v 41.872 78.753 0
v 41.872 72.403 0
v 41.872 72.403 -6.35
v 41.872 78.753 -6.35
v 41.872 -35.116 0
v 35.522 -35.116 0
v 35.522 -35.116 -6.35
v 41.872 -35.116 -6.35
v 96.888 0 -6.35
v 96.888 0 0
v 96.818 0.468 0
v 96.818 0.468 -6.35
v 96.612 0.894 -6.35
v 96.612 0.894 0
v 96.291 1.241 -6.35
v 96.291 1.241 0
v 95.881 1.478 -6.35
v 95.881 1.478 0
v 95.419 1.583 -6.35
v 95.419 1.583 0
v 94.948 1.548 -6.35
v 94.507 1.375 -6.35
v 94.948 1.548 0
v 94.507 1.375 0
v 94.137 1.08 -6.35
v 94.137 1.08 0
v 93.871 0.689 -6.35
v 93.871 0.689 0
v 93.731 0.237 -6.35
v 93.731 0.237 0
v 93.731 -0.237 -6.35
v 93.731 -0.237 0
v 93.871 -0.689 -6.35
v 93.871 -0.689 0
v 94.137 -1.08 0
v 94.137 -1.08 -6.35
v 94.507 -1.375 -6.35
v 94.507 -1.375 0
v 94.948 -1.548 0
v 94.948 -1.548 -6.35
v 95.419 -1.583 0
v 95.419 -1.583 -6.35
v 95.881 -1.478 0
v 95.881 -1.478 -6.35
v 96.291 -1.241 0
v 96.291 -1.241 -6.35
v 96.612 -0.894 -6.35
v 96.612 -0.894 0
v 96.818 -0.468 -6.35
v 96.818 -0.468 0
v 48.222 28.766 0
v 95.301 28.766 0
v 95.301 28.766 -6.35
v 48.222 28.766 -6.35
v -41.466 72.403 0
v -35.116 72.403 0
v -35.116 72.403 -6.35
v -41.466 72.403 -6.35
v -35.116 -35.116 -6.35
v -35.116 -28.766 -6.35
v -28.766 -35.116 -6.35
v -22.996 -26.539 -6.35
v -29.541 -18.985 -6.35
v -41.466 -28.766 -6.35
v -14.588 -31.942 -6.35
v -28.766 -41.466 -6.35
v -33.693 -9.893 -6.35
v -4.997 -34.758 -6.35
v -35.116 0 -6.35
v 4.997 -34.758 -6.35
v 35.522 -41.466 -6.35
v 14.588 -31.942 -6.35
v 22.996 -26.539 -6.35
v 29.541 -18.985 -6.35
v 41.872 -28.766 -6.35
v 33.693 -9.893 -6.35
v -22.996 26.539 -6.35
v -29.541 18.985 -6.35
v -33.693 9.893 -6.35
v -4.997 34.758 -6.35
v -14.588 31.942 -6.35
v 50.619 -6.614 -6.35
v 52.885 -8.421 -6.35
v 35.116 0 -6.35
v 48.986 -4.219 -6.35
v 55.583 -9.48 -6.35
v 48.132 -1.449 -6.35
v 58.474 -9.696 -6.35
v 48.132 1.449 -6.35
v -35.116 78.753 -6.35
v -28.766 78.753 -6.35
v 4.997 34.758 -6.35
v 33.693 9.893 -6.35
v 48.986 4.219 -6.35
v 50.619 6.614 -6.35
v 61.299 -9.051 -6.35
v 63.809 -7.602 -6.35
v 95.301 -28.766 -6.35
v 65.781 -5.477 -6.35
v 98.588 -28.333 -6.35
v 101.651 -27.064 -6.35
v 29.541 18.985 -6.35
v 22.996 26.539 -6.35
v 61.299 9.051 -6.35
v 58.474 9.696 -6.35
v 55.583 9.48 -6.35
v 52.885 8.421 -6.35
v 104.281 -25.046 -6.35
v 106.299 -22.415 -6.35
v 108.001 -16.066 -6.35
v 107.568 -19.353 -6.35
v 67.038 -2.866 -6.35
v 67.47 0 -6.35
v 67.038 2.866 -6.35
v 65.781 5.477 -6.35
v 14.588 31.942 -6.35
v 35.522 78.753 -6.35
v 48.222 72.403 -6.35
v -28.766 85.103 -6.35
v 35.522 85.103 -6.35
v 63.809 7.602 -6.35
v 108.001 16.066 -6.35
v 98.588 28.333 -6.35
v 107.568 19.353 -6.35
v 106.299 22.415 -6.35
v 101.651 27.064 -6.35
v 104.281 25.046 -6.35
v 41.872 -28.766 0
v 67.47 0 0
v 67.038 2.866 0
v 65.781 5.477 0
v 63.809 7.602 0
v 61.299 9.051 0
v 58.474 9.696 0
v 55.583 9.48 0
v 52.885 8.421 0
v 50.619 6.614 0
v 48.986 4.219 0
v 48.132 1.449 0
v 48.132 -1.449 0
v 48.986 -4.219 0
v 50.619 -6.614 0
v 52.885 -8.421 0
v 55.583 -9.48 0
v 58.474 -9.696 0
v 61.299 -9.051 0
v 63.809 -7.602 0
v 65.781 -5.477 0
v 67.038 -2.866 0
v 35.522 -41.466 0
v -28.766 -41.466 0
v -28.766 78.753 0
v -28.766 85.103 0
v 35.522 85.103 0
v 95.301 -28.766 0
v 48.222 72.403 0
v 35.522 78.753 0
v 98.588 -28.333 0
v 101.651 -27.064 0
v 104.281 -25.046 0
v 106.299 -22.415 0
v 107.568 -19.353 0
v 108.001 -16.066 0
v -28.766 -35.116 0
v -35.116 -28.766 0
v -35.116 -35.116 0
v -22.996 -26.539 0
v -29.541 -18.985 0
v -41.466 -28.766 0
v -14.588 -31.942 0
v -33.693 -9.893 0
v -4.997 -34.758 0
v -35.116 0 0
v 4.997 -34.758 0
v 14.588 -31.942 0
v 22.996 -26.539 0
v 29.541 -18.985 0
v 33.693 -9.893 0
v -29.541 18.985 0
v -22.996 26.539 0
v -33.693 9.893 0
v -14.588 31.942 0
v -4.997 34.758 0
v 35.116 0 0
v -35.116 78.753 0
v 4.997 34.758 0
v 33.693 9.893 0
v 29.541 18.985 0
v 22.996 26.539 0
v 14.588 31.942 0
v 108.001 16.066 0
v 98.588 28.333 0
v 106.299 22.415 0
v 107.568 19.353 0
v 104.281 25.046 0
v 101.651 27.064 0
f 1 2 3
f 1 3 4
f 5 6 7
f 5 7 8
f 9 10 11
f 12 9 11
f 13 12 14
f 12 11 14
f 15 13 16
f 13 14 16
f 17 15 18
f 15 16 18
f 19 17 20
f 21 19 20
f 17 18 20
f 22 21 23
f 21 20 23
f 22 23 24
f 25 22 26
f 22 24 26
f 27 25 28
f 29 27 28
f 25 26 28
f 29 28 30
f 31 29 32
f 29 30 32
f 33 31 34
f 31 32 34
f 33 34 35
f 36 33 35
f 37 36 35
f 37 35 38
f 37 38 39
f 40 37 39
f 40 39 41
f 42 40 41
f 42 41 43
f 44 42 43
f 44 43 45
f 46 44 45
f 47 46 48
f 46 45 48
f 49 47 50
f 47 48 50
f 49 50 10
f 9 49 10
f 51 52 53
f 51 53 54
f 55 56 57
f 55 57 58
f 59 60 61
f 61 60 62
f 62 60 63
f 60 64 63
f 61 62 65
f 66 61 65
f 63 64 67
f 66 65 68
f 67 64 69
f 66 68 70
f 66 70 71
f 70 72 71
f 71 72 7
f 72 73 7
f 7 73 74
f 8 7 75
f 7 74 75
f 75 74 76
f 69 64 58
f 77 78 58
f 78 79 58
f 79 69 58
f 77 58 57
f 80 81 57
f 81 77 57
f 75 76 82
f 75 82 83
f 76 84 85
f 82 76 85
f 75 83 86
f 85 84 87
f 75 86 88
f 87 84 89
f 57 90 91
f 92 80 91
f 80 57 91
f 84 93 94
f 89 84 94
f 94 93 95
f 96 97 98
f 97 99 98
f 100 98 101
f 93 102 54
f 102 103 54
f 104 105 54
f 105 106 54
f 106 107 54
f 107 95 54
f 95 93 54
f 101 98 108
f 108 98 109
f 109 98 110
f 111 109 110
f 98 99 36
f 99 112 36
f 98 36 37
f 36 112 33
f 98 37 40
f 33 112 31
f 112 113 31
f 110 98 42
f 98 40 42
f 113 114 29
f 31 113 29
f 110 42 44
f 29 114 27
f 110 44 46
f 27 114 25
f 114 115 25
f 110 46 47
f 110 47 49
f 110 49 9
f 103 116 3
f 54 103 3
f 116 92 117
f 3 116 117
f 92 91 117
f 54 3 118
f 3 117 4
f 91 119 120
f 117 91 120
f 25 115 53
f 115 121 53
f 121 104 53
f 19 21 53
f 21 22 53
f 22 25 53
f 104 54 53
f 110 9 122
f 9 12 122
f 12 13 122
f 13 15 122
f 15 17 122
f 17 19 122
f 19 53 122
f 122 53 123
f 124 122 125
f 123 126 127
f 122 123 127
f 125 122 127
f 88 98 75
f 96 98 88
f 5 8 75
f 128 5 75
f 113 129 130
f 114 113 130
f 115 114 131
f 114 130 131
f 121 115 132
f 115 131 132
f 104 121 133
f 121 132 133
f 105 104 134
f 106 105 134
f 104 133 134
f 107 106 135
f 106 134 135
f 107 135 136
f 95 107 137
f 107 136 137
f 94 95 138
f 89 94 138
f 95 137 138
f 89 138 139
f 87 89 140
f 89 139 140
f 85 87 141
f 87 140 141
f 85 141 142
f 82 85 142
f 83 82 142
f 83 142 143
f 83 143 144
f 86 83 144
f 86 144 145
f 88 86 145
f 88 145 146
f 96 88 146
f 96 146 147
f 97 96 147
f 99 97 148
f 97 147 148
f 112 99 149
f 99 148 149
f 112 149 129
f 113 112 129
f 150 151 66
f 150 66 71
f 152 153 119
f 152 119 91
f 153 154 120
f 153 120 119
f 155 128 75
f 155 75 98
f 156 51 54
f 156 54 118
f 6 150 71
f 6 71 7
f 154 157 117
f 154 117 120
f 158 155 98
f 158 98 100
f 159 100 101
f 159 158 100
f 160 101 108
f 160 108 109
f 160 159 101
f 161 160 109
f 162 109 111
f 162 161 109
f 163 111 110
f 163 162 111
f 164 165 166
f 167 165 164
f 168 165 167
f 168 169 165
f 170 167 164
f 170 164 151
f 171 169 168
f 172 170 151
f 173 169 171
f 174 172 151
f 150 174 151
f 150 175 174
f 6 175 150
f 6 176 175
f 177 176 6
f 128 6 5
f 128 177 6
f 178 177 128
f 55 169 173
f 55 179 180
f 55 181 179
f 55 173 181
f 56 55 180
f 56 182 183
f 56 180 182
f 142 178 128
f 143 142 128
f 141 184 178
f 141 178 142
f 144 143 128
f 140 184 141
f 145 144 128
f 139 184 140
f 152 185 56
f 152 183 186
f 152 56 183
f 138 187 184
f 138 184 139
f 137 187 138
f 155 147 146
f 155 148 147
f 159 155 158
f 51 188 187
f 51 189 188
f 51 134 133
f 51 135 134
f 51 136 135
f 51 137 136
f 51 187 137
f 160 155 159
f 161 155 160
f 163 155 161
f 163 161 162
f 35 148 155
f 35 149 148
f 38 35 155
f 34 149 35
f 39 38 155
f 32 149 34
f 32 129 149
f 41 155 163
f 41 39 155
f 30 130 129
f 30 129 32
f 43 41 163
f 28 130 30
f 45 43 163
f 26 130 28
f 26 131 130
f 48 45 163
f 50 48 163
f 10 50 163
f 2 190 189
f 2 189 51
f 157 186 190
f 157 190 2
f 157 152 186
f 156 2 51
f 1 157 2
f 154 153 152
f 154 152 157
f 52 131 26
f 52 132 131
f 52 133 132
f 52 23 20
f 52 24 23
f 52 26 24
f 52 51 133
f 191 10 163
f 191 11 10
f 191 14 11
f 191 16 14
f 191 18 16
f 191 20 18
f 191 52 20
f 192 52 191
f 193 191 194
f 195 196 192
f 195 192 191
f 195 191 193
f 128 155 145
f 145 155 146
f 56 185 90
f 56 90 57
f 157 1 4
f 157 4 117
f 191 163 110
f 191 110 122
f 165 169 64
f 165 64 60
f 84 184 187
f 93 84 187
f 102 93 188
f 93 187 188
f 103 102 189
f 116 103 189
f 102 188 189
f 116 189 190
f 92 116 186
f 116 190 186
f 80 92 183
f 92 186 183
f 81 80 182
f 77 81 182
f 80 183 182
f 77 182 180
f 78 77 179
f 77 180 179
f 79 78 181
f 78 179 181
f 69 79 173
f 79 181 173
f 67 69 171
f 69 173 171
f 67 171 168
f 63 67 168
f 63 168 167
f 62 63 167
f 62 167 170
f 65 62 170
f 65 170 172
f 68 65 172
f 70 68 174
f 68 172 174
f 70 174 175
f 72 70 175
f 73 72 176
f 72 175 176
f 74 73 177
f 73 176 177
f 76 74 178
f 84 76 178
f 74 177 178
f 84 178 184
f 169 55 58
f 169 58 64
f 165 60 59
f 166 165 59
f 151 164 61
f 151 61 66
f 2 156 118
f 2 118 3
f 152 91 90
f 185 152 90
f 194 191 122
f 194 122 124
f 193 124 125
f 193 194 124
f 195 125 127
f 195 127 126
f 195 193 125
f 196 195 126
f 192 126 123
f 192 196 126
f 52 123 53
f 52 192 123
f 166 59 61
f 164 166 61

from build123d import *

# Parameters (mm, degrees)
SKETCH1_R           = 35.1155
SKETCH1_R_2         = 9.7234375
SKETCH1_R_3         = 1.5875
BOSS_EXTRUDE1_DEPTH = 6.35


with BuildPart() as part:
    # Sketch1 → Boss-Extrude1 (new body)
    with BuildSketch(Plane.XY):
        with BuildLine():
            Line((-35.1155, -35.1155), (-28.7655, -35.1155))
            Line((-28.7655, -35.1155), (-28.7655, -41.4655))
            Line((-28.7655, -41.4655), (35.5219, -41.4655))
            Line((35.5219, -41.4655), (35.5219, -35.1155))
            Line((35.5219, -35.1155), (41.8719, -35.1155))
            Line((41.8719, -35.1155), (41.8719, -28.7655))
            Line((41.8719, -28.7655), (95.3008, -28.7655))
            ThreePointArc((95.3008, -28.7655), (104.281056121, -25.045756121), (108.0008, -16.0655))
            Line((108.0008, -16.0655), (108.0008, 16.0655))
            ThreePointArc((108.0008, 16.0655), (104.281056121, 25.045756121), (95.3008, 28.7655))
            Line((95.3008, 28.7655), (48.2219, 28.7655))
            Line((48.2219, 28.7655), (48.2219, 72.4027))
            Line((48.2219, 72.4027), (41.8719, 72.4027))
            Line((41.8719, 72.4027), (41.8719, 78.7527))
            Line((41.8719, 78.7527), (35.5219, 78.7527))
            Line((35.5219, 78.7527), (35.5219, 85.1027))
            Line((35.5219, 85.1027), (-28.7655, 85.1027))
            Line((-28.7655, 85.1027), (-28.7655, 78.7527))
            Line((-28.7655, 78.7527), (-35.1155, 78.7527))
            Line((-35.1155, 78.7527), (-35.1155, 72.4027))
            Line((-35.1155, 72.4027), (-41.4655, 72.4027))
            Line((-41.4655, 72.4027), (-41.4655, -28.7655))
            Line((-41.4655, -28.7655), (-35.1155, -28.7655))
            Line((-35.1155, -28.7655), (-35.1155, -35.1155))
        make_face()
        Circle(SKETCH1_R, mode=Mode.SUBTRACT)
        with Locations((57.7469, 0)):
            Circle(SKETCH1_R_2, mode=Mode.SUBTRACT)
        with Locations((95.3008, 0)):
            Circle(SKETCH1_R_3, mode=Mode.SUBTRACT)
    extrude(amount=-BOSS_EXTRUDE1_DEPTH)


solid = part.part
